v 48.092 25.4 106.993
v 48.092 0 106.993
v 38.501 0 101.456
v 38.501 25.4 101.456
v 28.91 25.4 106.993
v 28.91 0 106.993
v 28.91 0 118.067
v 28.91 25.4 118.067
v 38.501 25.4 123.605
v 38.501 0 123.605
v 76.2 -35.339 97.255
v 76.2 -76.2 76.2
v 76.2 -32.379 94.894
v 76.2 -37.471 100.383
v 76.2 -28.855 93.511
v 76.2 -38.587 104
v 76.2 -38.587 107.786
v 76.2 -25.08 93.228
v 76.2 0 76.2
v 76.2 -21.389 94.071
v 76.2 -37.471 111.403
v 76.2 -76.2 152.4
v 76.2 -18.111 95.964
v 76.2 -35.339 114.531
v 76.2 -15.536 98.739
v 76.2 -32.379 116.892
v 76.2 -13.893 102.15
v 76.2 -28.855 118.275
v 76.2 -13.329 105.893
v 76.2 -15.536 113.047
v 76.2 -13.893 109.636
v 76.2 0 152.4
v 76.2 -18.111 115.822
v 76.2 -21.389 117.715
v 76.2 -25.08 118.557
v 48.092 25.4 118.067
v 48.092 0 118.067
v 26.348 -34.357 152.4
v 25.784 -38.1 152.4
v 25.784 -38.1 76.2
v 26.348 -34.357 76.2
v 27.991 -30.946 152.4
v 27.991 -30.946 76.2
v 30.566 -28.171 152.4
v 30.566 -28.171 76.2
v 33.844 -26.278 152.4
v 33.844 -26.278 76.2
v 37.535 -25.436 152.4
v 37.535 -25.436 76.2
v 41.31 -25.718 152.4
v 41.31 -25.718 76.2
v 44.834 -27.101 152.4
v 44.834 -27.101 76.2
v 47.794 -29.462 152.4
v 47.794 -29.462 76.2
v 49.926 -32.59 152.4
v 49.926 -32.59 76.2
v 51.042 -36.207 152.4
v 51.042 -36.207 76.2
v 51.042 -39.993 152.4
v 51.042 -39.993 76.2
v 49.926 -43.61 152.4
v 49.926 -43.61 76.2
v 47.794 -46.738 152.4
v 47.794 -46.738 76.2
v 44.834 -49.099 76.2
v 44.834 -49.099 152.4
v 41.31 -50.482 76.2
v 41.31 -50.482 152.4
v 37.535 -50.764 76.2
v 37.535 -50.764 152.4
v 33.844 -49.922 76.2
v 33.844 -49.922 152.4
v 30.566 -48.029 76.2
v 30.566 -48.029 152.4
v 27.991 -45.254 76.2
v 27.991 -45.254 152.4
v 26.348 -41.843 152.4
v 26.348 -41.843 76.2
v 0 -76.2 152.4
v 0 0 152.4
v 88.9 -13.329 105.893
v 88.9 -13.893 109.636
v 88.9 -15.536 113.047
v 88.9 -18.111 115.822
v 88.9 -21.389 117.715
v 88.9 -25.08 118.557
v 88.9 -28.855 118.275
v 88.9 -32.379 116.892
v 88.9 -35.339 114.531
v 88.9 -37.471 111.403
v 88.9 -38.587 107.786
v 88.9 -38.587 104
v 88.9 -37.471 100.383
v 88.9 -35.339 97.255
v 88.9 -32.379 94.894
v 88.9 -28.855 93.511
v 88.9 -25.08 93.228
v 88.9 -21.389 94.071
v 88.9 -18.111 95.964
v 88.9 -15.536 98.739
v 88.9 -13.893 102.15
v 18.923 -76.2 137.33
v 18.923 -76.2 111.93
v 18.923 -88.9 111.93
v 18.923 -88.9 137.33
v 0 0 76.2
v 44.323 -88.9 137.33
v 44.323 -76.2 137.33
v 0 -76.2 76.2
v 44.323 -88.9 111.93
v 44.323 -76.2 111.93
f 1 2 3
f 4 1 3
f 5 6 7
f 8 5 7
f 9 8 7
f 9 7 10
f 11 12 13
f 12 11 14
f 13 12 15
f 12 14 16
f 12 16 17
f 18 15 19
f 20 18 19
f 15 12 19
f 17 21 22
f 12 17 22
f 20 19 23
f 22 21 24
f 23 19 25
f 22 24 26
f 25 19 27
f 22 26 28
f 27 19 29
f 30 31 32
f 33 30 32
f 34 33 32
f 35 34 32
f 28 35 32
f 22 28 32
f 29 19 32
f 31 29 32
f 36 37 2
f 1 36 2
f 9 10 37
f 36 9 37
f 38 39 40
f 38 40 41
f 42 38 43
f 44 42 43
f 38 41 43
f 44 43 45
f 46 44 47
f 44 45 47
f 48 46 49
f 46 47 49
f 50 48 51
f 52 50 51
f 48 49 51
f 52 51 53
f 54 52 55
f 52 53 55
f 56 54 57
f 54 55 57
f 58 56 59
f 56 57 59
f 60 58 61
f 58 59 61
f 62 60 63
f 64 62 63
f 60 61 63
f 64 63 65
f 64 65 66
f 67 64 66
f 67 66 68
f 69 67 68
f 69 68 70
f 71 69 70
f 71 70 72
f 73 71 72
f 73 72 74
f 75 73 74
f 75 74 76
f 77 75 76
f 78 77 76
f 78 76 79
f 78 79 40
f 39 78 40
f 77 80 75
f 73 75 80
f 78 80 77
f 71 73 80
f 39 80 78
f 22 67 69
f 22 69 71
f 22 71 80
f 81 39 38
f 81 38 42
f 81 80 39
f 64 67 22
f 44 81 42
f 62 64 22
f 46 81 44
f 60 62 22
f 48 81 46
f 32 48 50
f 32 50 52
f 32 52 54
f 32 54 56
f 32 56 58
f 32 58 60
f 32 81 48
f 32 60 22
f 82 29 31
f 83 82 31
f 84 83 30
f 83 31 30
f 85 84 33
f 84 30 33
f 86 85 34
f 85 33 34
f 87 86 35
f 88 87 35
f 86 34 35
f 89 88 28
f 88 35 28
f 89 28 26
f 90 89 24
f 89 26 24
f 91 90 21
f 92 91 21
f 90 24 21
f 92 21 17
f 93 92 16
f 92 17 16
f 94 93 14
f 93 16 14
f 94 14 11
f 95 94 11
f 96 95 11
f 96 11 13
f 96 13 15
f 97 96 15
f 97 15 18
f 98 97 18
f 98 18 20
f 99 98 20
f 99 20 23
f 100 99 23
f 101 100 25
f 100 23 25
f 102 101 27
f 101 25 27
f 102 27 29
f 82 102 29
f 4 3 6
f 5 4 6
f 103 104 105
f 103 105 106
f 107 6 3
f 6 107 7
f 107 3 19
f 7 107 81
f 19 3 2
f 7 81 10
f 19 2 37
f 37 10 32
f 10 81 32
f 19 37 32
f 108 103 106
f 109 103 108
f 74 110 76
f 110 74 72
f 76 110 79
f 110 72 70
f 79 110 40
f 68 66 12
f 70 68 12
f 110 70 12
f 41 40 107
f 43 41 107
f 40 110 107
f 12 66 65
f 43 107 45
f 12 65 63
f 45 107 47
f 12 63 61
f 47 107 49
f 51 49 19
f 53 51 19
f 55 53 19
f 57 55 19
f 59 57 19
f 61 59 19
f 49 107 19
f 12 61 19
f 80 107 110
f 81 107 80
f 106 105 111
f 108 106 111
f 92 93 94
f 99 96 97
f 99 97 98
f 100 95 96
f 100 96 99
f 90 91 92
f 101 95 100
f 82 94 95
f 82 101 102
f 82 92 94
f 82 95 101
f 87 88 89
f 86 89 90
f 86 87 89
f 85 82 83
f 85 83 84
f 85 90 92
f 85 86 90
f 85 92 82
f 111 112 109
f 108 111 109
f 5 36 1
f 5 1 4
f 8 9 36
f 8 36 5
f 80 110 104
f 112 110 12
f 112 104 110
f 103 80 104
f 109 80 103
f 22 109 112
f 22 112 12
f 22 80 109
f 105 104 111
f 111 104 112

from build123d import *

# Parameters (mm, degrees)
F0_W     = 76.2
F0_H     = 76.2
F1_DEPTH = 76.2
F3_D     = 25.4
F4_W     = 25.4
F4_H     = 25.4
F5_DEPTH = 12.7
F6_R     = 12.7
F7_DEPTH = 12.7
F9_DEPTH = 25.4


with BuildPart() as f1:
    # F0 (on Front) → F1 (new body)
    with BuildSketch(Plane.XZ):
        with Locations((38.1, 114.3)):
            Rectangle(F0_W, F0_H)
    extrude(amount=F1_DEPTH)

    # F3 (through all)
    with Locations(Plane.XY.offset(152.4)):
        with Locations((38.483977, -38.1)):
            Hole(F3_D / 2)

    # F4 (on face) → F5 (join)
    with BuildSketch(Plane.XZ.offset(76.2)):
        with Locations((31.623321, 124.629789)):
            Rectangle(F4_W, F4_H)
    extrude(amount=F5_DEPTH)

    # F6 (on face) → F7 (join)
    with BuildSketch(Plane.YZ.offset(76.2)):
        with Locations((-26.029168, 105.892979)):
            Circle(F6_R)
    extrude(amount=F7_DEPTH)

    # F8 (on face) → F9 (join)
    with BuildSketch(Plane(origin=(0, 0, 0), x_dir=(-1, 0, 0), z_dir=(0, 1, 0))):
        Polygon((-28.910244, 106.993121), (-28.910244, 118.067446), (-38.50089, 123.604608), (-48.091536, 118.067446), (-48.091536, 106.993121), (-38.50089, 101.455959), align=None)
    extrude(amount=F9_DEPTH)


solid = f1.part
